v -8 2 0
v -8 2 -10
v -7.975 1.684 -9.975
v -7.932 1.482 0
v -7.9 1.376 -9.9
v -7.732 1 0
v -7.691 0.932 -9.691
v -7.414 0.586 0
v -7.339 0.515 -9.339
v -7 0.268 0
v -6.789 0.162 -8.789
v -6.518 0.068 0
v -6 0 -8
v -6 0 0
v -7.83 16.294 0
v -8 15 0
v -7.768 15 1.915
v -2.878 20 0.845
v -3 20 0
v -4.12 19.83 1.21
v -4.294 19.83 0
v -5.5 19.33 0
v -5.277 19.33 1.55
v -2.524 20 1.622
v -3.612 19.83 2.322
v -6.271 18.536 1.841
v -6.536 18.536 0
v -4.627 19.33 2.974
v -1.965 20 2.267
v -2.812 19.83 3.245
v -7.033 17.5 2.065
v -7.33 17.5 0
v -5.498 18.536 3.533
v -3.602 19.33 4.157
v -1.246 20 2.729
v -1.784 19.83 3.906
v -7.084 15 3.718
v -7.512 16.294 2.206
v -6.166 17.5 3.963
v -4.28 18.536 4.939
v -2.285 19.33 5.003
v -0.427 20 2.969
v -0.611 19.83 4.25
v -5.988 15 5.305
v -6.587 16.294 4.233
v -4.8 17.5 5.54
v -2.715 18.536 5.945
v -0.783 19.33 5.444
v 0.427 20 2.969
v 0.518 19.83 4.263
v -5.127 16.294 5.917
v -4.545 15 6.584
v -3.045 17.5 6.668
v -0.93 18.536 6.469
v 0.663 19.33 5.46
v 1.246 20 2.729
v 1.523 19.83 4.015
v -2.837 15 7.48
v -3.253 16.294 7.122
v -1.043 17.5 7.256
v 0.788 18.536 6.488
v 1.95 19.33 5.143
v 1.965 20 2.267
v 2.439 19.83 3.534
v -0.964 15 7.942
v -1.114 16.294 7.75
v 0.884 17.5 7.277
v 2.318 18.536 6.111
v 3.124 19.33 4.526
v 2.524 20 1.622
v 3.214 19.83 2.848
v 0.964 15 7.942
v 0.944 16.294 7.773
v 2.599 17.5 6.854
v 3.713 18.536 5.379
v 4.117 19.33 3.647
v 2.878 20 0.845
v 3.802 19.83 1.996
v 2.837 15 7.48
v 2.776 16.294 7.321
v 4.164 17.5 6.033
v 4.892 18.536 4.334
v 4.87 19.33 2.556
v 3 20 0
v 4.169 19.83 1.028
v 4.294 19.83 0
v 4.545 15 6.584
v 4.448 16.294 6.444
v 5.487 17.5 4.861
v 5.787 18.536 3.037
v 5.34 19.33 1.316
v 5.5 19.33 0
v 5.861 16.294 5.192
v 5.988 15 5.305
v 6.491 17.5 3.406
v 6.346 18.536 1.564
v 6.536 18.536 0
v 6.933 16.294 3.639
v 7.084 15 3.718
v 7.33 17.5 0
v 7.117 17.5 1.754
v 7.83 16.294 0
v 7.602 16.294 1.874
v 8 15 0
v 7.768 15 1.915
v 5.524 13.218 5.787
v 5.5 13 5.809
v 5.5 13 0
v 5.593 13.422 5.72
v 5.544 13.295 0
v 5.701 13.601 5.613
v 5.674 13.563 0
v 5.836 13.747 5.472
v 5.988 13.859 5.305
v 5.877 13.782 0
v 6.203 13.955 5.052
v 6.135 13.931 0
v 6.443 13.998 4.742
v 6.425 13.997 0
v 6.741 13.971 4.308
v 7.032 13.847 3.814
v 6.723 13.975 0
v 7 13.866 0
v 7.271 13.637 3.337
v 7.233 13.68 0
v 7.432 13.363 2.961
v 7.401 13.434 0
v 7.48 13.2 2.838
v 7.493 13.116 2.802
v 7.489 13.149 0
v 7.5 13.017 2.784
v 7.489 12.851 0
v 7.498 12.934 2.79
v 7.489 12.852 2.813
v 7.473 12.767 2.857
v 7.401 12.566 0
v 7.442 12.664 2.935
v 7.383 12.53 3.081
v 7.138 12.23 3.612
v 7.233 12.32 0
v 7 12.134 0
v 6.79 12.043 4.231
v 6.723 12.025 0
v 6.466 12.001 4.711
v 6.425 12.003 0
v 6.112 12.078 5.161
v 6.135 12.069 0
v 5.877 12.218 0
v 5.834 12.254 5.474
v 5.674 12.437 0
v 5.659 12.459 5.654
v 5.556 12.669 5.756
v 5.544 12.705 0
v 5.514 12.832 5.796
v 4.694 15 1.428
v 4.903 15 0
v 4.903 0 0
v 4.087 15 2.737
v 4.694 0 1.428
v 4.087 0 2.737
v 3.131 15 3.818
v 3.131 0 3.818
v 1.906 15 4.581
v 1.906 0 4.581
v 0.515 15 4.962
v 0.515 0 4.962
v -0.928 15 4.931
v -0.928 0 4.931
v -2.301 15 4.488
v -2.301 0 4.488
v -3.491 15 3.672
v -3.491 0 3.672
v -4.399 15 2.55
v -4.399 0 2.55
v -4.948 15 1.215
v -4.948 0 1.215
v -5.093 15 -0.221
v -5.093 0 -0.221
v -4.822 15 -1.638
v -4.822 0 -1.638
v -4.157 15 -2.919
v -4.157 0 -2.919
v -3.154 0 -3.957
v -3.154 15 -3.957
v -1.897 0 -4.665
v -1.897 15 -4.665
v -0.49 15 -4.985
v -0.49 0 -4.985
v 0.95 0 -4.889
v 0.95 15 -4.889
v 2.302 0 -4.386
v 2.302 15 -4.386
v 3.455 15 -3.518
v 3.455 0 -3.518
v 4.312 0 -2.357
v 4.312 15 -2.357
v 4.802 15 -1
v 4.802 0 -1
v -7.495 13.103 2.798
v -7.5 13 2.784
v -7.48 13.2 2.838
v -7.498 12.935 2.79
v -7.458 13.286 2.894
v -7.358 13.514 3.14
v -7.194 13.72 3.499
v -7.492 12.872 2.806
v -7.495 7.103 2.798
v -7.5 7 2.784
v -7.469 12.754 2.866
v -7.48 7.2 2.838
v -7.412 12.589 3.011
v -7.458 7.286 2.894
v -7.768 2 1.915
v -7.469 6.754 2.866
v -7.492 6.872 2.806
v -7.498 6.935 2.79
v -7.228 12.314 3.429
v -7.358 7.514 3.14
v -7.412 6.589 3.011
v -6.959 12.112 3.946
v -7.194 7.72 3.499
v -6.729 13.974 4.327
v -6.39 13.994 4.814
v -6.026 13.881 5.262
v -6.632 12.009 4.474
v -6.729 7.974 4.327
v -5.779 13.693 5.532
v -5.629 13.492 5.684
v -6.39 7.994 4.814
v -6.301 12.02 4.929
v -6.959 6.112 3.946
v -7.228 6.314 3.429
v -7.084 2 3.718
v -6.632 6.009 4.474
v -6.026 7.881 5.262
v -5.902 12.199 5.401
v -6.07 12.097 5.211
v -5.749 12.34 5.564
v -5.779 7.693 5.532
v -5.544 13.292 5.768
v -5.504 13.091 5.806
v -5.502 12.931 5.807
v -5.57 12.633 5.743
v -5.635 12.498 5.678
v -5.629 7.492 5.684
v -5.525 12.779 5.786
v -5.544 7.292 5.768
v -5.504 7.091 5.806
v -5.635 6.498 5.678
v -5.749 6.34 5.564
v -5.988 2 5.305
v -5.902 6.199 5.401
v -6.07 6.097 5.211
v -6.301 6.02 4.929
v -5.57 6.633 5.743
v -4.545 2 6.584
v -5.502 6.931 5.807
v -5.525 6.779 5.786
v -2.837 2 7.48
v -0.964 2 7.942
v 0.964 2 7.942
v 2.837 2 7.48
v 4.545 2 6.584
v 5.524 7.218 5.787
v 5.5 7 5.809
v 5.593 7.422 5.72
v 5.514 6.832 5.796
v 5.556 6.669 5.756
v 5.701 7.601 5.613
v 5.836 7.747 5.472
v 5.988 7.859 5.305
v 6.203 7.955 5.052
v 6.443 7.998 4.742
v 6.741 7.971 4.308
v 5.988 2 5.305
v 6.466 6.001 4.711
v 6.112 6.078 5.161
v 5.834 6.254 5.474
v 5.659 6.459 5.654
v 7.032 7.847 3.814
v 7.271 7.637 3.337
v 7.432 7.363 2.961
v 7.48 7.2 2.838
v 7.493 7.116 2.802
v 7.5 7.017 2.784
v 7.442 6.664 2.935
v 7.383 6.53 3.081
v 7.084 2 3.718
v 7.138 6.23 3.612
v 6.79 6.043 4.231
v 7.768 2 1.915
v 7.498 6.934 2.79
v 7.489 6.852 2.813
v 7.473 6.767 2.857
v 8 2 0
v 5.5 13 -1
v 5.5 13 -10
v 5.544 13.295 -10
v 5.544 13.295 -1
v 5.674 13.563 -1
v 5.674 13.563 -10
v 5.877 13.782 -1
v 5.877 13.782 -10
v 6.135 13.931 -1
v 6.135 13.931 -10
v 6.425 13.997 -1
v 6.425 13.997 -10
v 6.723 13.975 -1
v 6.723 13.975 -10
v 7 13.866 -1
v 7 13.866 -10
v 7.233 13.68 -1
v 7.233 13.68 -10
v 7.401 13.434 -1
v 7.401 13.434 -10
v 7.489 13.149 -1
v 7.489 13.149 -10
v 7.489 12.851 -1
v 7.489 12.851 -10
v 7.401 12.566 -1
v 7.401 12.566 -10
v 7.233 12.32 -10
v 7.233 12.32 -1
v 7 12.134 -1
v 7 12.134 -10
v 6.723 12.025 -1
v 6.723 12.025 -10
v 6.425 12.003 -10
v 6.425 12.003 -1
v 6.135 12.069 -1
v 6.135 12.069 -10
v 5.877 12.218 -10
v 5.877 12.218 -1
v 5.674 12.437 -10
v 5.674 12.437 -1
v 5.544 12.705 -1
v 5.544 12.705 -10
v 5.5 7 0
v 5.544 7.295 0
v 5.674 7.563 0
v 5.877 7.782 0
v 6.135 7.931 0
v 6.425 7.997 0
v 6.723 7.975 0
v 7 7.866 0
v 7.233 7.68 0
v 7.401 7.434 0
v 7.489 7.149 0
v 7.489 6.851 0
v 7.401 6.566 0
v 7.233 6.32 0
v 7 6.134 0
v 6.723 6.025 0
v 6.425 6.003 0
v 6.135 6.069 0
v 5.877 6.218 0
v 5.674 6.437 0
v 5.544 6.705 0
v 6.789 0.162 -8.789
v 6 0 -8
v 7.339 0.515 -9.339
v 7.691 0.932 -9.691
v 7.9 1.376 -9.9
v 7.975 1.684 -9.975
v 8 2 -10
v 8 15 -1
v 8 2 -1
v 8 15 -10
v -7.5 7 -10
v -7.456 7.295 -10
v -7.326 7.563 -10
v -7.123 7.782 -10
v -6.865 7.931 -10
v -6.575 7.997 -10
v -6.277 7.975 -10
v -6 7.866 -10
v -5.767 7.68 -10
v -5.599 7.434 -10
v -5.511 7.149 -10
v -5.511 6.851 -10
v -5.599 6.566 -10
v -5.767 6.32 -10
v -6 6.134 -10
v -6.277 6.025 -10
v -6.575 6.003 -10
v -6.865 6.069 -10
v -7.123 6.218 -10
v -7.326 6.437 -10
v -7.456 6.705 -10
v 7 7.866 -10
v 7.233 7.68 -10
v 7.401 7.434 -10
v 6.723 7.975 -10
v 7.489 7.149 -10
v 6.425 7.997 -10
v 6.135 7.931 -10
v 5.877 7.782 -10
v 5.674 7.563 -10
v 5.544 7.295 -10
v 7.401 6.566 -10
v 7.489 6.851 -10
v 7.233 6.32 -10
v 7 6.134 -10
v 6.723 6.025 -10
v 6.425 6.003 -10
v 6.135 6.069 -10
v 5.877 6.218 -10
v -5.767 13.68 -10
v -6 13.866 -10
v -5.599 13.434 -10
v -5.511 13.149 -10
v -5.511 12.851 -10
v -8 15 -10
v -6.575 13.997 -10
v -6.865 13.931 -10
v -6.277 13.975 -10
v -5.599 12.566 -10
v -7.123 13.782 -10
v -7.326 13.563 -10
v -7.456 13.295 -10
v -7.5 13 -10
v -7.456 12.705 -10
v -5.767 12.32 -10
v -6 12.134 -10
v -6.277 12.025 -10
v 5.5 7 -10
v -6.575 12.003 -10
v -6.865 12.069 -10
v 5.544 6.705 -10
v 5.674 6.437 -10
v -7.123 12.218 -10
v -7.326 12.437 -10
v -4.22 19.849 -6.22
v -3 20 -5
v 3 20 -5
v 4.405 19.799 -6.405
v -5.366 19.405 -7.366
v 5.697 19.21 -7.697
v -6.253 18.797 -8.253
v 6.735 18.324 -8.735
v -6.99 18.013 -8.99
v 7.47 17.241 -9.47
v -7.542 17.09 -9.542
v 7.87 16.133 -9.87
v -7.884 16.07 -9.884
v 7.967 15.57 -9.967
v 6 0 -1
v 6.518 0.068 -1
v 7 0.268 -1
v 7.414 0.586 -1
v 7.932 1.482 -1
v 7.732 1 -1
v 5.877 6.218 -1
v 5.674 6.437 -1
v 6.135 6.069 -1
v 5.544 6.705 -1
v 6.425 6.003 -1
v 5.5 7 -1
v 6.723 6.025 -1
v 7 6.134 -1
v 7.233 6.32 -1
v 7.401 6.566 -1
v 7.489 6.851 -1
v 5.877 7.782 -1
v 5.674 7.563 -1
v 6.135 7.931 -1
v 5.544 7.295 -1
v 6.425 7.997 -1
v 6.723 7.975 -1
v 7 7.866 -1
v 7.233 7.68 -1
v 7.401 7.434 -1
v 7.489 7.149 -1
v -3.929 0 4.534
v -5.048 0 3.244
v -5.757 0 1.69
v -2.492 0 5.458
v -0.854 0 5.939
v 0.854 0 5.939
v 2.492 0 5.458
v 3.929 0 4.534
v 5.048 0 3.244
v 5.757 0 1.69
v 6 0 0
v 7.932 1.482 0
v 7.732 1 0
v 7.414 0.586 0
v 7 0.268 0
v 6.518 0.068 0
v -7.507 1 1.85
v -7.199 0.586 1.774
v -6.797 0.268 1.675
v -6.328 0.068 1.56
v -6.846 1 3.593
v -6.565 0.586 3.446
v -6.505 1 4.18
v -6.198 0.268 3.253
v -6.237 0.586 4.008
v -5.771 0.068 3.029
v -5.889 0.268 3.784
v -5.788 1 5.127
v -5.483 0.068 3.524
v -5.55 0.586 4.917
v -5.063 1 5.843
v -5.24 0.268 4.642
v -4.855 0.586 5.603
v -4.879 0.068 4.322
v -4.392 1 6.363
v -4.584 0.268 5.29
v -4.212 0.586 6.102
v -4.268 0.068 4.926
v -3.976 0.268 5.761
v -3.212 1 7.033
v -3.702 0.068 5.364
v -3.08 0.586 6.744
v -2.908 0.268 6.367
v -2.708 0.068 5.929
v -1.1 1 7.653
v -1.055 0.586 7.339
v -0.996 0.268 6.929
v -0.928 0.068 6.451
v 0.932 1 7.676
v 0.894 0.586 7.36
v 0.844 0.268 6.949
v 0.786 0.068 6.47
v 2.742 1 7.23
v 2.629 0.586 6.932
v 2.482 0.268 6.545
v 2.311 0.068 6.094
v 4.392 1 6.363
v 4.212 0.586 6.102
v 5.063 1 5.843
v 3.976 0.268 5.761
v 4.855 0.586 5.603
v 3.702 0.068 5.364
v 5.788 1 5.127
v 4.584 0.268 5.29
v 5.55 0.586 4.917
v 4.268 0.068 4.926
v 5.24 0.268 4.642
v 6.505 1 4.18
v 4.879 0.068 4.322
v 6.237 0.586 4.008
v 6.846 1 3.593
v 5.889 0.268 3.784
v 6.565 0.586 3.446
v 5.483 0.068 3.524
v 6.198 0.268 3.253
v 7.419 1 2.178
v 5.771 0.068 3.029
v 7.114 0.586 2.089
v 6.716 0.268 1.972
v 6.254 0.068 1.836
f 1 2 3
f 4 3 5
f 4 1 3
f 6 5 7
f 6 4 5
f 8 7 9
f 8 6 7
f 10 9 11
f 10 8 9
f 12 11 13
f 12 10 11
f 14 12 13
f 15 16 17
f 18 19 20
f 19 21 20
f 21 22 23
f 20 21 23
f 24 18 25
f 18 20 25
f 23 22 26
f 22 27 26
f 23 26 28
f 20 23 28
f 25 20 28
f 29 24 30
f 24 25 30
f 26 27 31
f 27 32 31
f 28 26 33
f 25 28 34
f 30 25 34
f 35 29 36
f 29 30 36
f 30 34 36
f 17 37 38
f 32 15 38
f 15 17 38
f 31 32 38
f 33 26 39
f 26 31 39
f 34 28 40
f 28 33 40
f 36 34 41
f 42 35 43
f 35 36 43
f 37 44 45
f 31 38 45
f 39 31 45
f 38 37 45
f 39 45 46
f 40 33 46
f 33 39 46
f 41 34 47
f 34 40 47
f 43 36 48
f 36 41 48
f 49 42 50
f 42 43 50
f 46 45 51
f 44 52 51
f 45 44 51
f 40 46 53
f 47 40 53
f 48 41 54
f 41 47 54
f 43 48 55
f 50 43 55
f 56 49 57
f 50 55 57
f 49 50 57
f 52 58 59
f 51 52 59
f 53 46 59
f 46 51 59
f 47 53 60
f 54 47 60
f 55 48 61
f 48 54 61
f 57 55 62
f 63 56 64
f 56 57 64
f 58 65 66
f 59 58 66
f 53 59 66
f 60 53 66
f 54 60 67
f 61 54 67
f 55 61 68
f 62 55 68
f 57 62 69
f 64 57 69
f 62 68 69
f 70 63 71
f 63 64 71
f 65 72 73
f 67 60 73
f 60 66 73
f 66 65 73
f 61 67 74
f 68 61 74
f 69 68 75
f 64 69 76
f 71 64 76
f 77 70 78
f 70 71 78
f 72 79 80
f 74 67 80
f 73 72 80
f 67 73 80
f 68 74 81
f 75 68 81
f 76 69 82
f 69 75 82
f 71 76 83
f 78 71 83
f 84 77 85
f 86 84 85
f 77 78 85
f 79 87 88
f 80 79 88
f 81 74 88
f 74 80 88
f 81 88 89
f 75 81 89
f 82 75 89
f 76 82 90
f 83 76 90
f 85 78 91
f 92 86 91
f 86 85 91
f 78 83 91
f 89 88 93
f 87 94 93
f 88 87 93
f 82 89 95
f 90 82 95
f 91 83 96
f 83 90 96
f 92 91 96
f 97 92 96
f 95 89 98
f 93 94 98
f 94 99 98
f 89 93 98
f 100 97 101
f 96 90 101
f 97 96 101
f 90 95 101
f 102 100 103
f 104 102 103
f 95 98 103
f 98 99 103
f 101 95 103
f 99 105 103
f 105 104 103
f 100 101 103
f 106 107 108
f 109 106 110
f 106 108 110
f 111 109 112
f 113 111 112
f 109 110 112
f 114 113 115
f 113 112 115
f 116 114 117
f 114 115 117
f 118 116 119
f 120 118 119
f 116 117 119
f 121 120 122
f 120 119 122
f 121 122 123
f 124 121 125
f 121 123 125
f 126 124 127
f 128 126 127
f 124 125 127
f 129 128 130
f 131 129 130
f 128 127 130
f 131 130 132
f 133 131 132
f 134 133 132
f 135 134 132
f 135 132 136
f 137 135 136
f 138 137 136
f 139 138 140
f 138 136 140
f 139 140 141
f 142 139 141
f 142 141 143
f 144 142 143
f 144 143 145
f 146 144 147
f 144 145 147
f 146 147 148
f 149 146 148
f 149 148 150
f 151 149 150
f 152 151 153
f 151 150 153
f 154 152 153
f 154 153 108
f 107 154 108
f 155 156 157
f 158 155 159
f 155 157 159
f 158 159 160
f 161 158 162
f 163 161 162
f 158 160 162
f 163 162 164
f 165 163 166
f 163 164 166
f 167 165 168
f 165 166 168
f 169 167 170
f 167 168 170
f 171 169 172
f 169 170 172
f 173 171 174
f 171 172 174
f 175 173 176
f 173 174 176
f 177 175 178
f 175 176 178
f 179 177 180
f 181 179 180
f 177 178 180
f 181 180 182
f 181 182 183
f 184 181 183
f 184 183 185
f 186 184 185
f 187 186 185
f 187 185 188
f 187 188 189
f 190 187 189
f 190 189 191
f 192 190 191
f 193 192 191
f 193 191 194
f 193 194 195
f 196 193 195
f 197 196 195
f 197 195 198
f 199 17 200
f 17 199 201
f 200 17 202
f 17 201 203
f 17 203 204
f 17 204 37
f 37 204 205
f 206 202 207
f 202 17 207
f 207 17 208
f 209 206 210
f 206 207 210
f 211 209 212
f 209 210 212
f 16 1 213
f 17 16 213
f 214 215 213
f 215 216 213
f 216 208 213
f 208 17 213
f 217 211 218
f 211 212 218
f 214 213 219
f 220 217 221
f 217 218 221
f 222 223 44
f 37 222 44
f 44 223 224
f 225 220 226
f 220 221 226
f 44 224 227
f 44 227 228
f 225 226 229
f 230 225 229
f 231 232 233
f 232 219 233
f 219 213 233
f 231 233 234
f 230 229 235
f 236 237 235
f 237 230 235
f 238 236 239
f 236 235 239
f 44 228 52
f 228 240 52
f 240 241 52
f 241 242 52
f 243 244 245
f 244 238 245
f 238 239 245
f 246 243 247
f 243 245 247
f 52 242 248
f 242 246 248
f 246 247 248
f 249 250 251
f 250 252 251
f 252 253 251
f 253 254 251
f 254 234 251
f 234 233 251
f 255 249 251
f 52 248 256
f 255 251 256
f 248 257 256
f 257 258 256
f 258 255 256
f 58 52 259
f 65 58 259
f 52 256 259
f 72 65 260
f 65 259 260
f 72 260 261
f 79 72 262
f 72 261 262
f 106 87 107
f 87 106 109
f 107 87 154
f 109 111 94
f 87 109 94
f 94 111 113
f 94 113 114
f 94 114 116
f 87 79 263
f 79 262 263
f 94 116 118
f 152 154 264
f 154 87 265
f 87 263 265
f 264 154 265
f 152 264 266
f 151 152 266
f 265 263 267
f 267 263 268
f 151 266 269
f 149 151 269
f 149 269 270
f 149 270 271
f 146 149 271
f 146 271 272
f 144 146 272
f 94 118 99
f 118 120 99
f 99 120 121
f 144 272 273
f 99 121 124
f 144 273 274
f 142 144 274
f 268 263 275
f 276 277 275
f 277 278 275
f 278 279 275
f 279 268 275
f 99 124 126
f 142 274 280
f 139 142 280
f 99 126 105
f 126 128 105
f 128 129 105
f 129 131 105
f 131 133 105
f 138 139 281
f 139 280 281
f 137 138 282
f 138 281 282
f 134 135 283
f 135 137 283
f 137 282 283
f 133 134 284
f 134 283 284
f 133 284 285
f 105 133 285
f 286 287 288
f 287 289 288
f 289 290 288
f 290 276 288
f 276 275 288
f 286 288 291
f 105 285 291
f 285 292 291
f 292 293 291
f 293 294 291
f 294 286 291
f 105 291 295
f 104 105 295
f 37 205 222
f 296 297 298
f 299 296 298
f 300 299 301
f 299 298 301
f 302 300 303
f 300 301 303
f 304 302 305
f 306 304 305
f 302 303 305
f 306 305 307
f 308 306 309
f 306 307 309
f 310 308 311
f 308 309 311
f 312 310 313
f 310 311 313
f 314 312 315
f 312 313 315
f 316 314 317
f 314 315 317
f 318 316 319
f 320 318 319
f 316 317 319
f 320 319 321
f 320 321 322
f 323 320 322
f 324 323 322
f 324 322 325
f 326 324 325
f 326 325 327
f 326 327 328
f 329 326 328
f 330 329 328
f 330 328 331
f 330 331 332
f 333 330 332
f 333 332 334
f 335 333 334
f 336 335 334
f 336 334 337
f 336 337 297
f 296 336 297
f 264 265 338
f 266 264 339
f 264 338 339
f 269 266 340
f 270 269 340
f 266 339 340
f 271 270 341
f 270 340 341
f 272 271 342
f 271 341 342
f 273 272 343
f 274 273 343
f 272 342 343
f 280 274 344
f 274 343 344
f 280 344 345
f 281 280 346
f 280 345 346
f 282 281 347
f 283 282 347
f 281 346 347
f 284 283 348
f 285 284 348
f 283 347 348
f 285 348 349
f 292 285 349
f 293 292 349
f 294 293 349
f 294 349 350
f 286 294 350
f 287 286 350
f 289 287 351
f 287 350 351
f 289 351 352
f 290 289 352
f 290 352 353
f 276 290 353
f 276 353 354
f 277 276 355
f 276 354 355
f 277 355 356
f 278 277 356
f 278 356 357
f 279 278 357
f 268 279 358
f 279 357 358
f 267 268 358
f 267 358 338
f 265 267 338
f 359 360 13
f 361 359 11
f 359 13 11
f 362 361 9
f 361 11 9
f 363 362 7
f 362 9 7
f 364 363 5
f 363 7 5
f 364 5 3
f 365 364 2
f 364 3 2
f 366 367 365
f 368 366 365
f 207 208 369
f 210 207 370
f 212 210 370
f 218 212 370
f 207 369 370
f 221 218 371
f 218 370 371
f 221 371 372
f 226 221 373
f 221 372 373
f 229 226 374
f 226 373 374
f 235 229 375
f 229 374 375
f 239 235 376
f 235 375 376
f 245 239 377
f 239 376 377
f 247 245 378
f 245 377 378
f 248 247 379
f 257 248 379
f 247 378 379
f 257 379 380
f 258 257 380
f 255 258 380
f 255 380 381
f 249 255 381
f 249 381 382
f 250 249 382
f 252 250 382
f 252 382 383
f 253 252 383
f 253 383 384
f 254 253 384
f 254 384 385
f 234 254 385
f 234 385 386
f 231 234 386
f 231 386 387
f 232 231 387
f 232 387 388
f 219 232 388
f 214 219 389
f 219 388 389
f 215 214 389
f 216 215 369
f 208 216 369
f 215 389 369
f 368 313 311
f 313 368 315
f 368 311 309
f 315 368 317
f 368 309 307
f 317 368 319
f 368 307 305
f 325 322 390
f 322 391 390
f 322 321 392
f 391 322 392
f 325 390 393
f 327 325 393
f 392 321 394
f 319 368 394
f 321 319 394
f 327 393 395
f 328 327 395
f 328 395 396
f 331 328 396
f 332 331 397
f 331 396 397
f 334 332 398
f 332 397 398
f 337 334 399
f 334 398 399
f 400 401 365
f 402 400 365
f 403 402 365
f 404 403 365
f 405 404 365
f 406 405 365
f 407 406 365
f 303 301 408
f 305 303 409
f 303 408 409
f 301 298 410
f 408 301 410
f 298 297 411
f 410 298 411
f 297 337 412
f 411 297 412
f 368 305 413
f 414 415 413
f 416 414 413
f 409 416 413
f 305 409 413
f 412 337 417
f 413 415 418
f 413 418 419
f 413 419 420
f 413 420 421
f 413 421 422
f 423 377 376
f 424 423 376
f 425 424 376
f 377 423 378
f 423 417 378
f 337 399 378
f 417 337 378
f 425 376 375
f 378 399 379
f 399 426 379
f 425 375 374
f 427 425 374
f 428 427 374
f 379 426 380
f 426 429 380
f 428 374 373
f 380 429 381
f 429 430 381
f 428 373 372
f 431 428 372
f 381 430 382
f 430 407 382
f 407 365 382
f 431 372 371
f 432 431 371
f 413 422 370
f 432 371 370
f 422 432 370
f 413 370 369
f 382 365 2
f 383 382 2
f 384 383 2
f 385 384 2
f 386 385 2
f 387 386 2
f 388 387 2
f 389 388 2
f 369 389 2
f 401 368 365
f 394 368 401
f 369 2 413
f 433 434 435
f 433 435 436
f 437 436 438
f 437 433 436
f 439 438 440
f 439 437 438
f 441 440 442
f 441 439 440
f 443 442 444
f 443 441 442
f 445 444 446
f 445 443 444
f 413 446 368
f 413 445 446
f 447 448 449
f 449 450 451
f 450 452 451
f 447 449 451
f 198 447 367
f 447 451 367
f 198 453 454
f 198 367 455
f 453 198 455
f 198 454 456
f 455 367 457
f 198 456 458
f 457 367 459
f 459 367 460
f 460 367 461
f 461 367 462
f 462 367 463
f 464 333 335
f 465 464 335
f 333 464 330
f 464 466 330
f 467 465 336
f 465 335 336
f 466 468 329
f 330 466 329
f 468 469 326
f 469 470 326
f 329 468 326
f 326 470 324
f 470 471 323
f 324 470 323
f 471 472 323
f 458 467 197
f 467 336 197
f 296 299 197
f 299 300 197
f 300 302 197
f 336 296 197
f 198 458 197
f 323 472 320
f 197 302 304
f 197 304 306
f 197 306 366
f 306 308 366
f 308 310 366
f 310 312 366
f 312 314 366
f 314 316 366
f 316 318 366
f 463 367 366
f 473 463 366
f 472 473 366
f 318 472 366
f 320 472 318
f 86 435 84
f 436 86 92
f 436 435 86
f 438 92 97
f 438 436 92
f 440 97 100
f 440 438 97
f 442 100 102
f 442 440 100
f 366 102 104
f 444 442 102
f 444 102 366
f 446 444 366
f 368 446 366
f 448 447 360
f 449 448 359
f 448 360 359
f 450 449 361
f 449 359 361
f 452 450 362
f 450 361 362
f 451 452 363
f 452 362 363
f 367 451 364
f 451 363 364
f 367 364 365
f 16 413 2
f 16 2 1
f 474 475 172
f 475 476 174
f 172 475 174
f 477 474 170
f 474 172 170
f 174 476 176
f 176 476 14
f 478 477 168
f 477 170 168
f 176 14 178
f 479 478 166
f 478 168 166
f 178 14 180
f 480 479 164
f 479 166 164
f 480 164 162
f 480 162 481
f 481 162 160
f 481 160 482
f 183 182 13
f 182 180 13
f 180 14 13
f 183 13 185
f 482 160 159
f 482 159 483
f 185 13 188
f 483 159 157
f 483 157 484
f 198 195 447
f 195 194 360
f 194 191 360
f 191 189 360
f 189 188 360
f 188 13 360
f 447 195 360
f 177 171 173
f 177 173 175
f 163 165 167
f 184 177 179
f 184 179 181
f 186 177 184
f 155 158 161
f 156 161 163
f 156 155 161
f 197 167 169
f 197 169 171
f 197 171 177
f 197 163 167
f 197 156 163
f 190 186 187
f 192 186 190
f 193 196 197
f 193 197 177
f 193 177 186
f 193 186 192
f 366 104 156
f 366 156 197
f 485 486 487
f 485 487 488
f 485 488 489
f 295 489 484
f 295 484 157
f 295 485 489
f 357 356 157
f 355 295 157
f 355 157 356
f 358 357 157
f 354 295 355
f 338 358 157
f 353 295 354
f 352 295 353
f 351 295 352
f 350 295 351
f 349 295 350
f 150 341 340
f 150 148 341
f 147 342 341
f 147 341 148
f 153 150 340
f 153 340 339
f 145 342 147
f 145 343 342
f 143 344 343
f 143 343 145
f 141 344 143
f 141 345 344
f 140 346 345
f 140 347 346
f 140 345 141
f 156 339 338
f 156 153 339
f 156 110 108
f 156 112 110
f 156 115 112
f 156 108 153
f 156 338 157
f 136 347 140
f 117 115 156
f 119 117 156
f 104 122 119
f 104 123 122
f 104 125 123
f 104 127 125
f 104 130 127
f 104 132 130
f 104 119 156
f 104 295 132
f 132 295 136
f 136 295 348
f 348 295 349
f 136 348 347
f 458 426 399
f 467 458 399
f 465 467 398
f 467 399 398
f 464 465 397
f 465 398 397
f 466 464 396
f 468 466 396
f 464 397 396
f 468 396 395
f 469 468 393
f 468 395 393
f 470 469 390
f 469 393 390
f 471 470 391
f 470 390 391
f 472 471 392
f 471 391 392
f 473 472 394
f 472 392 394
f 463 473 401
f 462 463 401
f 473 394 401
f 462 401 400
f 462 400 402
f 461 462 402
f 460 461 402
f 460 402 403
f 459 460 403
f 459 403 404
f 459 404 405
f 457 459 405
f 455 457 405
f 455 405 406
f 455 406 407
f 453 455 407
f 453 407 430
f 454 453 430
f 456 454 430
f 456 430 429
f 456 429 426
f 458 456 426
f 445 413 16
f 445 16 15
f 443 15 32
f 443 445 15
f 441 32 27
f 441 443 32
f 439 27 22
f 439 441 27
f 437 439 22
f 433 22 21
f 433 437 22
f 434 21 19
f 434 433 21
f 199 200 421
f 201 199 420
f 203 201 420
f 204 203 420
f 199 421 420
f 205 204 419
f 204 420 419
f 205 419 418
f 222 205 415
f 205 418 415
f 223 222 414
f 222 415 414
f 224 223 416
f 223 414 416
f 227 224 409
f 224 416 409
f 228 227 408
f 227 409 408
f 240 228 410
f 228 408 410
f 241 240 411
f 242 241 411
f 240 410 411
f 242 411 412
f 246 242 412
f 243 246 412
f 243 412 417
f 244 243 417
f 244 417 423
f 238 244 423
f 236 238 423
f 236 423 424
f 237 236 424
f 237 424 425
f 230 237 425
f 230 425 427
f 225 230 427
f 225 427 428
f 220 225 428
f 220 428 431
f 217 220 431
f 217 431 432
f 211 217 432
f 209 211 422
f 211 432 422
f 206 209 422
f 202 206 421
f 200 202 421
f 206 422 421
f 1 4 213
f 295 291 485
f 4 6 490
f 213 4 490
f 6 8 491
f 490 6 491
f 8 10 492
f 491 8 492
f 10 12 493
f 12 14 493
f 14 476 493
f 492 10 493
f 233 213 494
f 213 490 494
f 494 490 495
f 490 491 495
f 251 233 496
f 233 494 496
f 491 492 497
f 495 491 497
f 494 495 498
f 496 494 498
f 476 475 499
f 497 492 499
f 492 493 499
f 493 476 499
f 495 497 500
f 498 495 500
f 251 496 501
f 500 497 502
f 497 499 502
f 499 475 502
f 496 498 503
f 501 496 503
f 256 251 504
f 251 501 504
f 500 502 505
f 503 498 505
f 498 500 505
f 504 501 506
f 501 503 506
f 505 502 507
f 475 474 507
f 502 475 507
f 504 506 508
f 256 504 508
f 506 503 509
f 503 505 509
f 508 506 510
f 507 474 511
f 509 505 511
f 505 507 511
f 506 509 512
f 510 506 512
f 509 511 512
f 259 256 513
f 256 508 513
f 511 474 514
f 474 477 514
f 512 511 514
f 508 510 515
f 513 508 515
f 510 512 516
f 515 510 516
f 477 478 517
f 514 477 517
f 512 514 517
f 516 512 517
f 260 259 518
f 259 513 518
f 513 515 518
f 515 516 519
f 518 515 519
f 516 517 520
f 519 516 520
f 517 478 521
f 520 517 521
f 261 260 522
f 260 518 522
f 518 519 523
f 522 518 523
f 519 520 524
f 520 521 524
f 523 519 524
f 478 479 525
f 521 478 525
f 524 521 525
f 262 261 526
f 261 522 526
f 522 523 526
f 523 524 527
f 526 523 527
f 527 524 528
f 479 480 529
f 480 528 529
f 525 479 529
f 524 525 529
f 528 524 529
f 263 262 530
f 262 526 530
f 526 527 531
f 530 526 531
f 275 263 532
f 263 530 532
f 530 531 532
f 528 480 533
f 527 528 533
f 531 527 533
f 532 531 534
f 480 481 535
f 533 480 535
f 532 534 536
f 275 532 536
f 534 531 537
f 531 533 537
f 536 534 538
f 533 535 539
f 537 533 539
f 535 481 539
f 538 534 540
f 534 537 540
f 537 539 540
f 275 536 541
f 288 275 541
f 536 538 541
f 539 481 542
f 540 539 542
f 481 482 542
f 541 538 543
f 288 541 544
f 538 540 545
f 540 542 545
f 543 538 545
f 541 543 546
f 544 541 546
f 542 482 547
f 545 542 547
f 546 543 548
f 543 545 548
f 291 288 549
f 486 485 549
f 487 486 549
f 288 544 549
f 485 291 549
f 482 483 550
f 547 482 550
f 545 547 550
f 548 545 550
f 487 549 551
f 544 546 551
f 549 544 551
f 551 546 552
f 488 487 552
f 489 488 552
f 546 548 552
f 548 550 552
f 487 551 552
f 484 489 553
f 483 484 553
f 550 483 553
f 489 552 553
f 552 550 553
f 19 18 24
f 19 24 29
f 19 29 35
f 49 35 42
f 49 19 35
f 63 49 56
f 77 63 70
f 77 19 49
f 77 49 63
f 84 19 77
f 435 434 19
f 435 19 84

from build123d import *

# Parameters (mm, degrees)
BOSS_EXTRU_1_DEPTH           = 15
ESQUISSE3_R                  = 5
BOSS_EXTRU_3_DEPTH           = 5
ENL_V_MAT_EXTRU_2_REACH      = 30.071
ESQUISSE4_R                  = 1
ENL_V_MAT_EXTRU_3_REACH      = 29.495
ENL_V_MAT_EXTRU_3_END_RADIUS = 5
ESQUISSE5_W                  = 1
ESQUISSE5_H                  = 15
CONG_3_START                 = -10
CONG_3_DEPTH                 = 18
CONG_3_START_2               = -9
CONG_3_2_DEPTH               = 18
CONG_3_3_ANGLE               = 180
CONG_5_R                     = 2


with BuildPart() as part:
    # Esquisse1 → Boss.-Extru.1 (new body)
    with BuildSketch(Plane(origin=(0, 0, 0), x_dir=(1, 0, 0), z_dir=(0, 1, 0))):
        with BuildLine():
            ThreePointArc((-8, 0), (0, 8), (8, 0))
            Line((8, 0), (8, 10))
            Line((8, 10), (-8, 10))
            Line((-8, 10), (-8, 0))
        make_face()
        with BuildLine():
            ThreePointArc((-8, 0), (0, -8), (8, 0))
            Line((8, 0), (4.902542424, 0))
            ThreePointArc((4.902542424, 0), (-0.097457576, -5), (-5.097457576, 0))
            Line((-5.097457576, 0), (-8, 0))
        make_face()
        with BuildLine():
            Line((4.902542424, 0), (8, 0))
            ThreePointArc((8, 0), (0, 8), (-8, 0))
            Line((-8, 0), (-5.097457576, 0))
            ThreePointArc((-5.097457576, 0), (-0.097457576, 5), (4.902542424, 0))
        make_face()
    extrude(amount=BOSS_EXTRU_1_DEPTH)

    # Esquisse3 → Boss.-Extru.3 (add)
    # profile 1 of 3: a face of its own
    with BuildSketch(Plane(origin=(0, 15, 0), x_dir=(1, 0, 0), z_dir=(0, 1, 0))):
        with BuildLine():
            ThreePointArc((8, 0), (0, 8), (-8, 0))
            ThreePointArc((-8, 0), (0, -8), (8, 0))
        make_face()
        with Locations(Location((-0.097457576, 0, 0), (0, 0, 270))):
            Circle(ESQUISSE3_R, mode=Mode.SUBTRACT)
    # profile 2 of 3: a face of its own
    with BuildSketch(Plane(origin=(0, 15, 0), x_dir=(1, 0, 0), z_dir=(0, 1, 0))):
        with Locations(Location((-0.097457576, 0, 0), (0, 0, 270))):
            Circle(ESQUISSE3_R)
    # profile 3 of 3: a face of its own
    with BuildSketch(Plane(origin=(0, 15, 0), x_dir=(1, 0, 0), z_dir=(0, 1, 0))):
        with BuildLine():
            Line((-8, 10), (-8, 0))
            ThreePointArc((-8, 0), (0, 8), (8, 0))
            Line((8, 0), (8, 10))
            Line((8, 10), (-8, 10))
        make_face()
    extrude(amount=BOSS_EXTRU_3_DEPTH)

    # Esquisse4 → Enlèv. mat.-Extru.2 (cut, up to next)
    with BuildSketch(Plane(origin=(0, 0, -10), x_dir=(-1, 0, 0), z_dir=(0, 0, -1)), mode=Mode.PRIVATE) as enl_v_mat_extru_2_sk1:
        with Locations((-6.5, 13)):
            Circle(ESQUISSE4_R)
    enl_v_mat_extru_2_tool1 = extrude(enl_v_mat_extru_2_sk1.sketch, amount=-ENL_V_MAT_EXTRU_2_REACH, mode=Mode.PRIVATE) & part.part
    # Esquisse4 → Enlèv. mat.-Extru.2 (cut, up to next)
    with BuildSketch(Plane(origin=(0, 0, -10), x_dir=(-1, 0, 0), z_dir=(0, 0, -1)), mode=Mode.PRIVATE) as enl_v_mat_extru_2_sk2:
        with Locations((6.5, 13)):
            Circle(ESQUISSE4_R)
    enl_v_mat_extru_2_tool2 = extrude(enl_v_mat_extru_2_sk2.sketch, amount=-ENL_V_MAT_EXTRU_2_REACH, mode=Mode.PRIVATE) & part.part
    # Esquisse4 → Enlèv. mat.-Extru.2 (cut, up to next)
    with BuildSketch(Plane(origin=(0, 0, -10), x_dir=(-1, 0, 0), z_dir=(0, 0, -1)), mode=Mode.PRIVATE) as enl_v_mat_extru_2_sk3:
        with Locations((6.5, 7)):
            Circle(ESQUISSE4_R)
    enl_v_mat_extru_2_tool3 = extrude(enl_v_mat_extru_2_sk3.sketch, amount=-ENL_V_MAT_EXTRU_2_REACH, mode=Mode.PRIVATE) & part.part
    # Esquisse4 → Enlèv. mat.-Extru.2 (cut, up to next)
    with BuildSketch(Plane(origin=(0, 0, -10), x_dir=(-1, 0, 0), z_dir=(0, 0, -1)), mode=Mode.PRIVATE) as enl_v_mat_extru_2_sk4:
        with Locations((-6.5, 7)):
            Circle(ESQUISSE4_R)
    enl_v_mat_extru_2_tool4 = extrude(enl_v_mat_extru_2_sk4.sketch, amount=-ENL_V_MAT_EXTRU_2_REACH, mode=Mode.PRIVATE) & part.part
    add(enl_v_mat_extru_2_tool1.solids().sort_by_distance((6.5, 13, -10))[0], mode=Mode.SUBTRACT)
    add(enl_v_mat_extru_2_tool2.solids().sort_by_distance((-6.5, 13, -10))[0], mode=Mode.SUBTRACT)
    add(enl_v_mat_extru_2_tool3.solids().sort_by_distance((-6.5, 7, -10))[0], mode=Mode.SUBTRACT)
    add(enl_v_mat_extru_2_tool4.solids().sort_by_distance((6.5, 7, -10))[0], mode=Mode.SUBTRACT)

    # Enlèv. mat.-Extru.3: up to this cylinder (the profile starts outside it)
    enl_v_mat_extru_3_end = Plane(origin=(-0.097457576, 7.5, 0), z_dir=(0, -1, 0)) * Cylinder(ENL_V_MAT_EXTRU_3_END_RADIUS, 69.99, mode=Mode.PRIVATE)
    # Esquisse5 → Enlèv. mat.-Extru.3 (cut, up to the surface)
    with BuildSketch(Plane(origin=(8, 0, 0), x_dir=(0, 0, -1), z_dir=(1, 0, 0)), mode=Mode.PRIVATE) as enl_v_mat_extru_3_sk1:
        with Locations((0.5, 7.5)):
            Rectangle(ESQUISSE5_W, ESQUISSE5_H)
    enl_v_mat_extru_3_tool1 = extrude(enl_v_mat_extru_3_sk1.sketch, amount=-ENL_V_MAT_EXTRU_3_REACH, mode=Mode.PRIVATE) - enl_v_mat_extru_3_end
    add(enl_v_mat_extru_3_tool1.solids().sort_by_distance((8, 7.5, -0.5))[0], mode=Mode.SUBTRACT)

    # Congé3: read off the stored shape, not the designer's step
    # Congé3 outline → Congé3 (cut)
    with BuildSketch(Plane.XY.offset(CONG_3_START)):
        with BuildLine():
            ThreePointArc((-8, 15), (-6.535533906, 18.535533906), (-3, 20))
            Line((-3, 20), (-8, 20))
            Line((-8, 20), (-8, 15))
        make_face()
        with BuildLine():
            ThreePointArc((3, 20), (6.535533906, 18.535533906), (8, 15))
            Line((8, 15), (8, 20))
            Line((8, 20), (3, 20))
        make_face()
    extrude(amount=CONG_3_DEPTH, mode=Mode.SUBTRACT)

    # Cong_3 2 outline → Cong_3 2 (cut)
    with BuildSketch(Plane.YZ.offset(CONG_3_START_2)):
        with BuildLine():
            ThreePointArc((20, -5), (18.535533906, -8.535533906), (15, -10))
            Line((15, -10), (20, -10))
            Line((20, -10), (20, -5))
        make_face()
    extrude(amount=CONG_3_2_DEPTH, mode=Mode.SUBTRACT)

    # Cong_3 3 outline → Cong_3 3 (revolve, cut)
    with BuildSketch(Plane(origin=(0, 0, 0), x_dir=(-1, 0, 0), z_dir=(0, 0, -1))):
        with BuildLine():
            ThreePointArc((3, 20), (6.535533906, 18.535533906), (8, 15))
            Line((8, 15), (8, 20))
            Line((8, 20), (3, 20))
        make_face()
    revolve(axis=Axis((0, 0, 0), (0, 1, 0)), revolution_arc=CONG_3_3_ANGLE, mode=Mode.SUBTRACT)

    # Congé5
    cong_5_edges = [part.edges().sort_by_distance(p)[0] for p in [
        (8, 0, -5.5),
        (0, 0, -10),
        (0, 0, 8),
        (-8, 0, -5),
    ]]
    fillet(cong_5_edges, radius=CONG_5_R)


solid = part.part
